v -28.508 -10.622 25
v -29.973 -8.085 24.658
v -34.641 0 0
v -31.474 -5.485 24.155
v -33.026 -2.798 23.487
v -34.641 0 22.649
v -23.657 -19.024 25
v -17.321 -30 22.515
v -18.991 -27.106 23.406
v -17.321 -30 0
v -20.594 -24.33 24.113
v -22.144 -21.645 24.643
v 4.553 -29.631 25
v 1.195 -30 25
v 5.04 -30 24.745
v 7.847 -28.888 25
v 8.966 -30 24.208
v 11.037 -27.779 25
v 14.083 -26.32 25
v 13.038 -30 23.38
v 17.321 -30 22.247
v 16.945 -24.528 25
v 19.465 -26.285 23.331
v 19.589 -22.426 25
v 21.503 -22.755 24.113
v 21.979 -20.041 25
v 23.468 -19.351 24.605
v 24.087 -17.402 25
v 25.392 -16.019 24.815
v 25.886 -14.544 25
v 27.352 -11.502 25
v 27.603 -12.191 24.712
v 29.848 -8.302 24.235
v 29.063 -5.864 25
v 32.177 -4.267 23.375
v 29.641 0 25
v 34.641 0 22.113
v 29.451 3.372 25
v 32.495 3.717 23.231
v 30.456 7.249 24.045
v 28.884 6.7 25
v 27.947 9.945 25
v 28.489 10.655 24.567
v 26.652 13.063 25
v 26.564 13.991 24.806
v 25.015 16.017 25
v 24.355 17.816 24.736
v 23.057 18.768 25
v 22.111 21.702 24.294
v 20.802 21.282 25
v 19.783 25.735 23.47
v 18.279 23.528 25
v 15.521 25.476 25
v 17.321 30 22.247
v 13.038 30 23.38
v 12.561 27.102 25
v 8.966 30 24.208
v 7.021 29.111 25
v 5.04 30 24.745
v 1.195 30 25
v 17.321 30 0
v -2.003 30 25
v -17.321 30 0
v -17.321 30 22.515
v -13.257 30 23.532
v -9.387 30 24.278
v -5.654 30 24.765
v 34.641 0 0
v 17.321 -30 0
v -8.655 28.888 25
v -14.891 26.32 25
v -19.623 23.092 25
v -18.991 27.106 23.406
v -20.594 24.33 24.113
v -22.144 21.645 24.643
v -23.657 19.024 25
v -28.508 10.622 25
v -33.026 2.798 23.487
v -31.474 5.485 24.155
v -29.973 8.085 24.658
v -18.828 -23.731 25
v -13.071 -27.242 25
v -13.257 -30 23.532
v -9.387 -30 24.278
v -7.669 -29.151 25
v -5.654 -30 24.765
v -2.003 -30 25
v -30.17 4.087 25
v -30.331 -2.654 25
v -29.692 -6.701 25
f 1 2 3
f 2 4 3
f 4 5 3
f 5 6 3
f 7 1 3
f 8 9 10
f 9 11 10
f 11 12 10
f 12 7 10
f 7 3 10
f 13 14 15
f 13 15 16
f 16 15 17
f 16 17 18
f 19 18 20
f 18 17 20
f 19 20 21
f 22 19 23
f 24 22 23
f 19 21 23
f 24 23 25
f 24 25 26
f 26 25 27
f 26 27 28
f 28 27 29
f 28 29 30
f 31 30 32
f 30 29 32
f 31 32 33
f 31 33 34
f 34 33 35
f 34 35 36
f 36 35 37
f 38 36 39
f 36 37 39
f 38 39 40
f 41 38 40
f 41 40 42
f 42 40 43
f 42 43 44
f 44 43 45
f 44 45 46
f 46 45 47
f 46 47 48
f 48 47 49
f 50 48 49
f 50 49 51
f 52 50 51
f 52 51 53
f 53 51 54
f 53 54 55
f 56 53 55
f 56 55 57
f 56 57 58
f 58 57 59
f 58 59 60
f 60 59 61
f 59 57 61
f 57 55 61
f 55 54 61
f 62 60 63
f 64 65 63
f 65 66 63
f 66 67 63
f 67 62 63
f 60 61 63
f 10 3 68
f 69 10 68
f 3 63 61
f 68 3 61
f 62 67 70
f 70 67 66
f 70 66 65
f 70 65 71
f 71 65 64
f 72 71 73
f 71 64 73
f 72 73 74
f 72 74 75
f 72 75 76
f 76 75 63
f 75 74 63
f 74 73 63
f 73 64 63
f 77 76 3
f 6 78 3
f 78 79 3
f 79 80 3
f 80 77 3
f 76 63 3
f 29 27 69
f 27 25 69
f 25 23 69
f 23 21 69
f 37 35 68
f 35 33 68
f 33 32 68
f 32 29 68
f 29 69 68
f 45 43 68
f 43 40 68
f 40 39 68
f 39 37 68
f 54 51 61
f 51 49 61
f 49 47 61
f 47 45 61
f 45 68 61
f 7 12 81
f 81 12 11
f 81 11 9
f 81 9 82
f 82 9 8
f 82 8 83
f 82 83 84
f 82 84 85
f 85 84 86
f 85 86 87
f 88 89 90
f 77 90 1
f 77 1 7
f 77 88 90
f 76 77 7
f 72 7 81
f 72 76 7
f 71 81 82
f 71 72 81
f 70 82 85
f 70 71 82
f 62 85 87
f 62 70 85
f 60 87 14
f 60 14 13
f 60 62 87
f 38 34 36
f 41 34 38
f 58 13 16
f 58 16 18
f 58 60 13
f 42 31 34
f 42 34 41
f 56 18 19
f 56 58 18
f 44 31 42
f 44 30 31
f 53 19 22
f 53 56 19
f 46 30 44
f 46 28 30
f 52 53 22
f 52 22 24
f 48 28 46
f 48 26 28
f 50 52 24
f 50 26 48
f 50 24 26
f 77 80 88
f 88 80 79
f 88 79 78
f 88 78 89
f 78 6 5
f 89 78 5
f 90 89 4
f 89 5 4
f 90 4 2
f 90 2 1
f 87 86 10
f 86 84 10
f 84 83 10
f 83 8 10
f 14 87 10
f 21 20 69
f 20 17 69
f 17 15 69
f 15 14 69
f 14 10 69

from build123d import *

# Parameters (mm, degrees)
F1_DEPTH = 25


with BuildPart() as f1:
    # F0 (on Top) → F1 (new body)
    with BuildSketch(Plane.XY):
        Polygon((17.320508, 30), (-17.320508, 30), (-34.641016, 0), (-17.320508, -30), (17.320508, -30), (34.641016, 0), align=None)
    extrude(amount=F1_DEPTH)

    # F2 (on Front) → F3 (revolve, cut)
    with BuildSketch(Plane.XZ):
        Polygon((34.641016, 22.113249), (34.641016, 25), (29.641016, 25), align=None)
    revolve(axis=Axis((-0.115662, 0, 18.696133), (0.006201, 0, 0.999981)), mode=Mode.SUBTRACT)


solid = f1.part
